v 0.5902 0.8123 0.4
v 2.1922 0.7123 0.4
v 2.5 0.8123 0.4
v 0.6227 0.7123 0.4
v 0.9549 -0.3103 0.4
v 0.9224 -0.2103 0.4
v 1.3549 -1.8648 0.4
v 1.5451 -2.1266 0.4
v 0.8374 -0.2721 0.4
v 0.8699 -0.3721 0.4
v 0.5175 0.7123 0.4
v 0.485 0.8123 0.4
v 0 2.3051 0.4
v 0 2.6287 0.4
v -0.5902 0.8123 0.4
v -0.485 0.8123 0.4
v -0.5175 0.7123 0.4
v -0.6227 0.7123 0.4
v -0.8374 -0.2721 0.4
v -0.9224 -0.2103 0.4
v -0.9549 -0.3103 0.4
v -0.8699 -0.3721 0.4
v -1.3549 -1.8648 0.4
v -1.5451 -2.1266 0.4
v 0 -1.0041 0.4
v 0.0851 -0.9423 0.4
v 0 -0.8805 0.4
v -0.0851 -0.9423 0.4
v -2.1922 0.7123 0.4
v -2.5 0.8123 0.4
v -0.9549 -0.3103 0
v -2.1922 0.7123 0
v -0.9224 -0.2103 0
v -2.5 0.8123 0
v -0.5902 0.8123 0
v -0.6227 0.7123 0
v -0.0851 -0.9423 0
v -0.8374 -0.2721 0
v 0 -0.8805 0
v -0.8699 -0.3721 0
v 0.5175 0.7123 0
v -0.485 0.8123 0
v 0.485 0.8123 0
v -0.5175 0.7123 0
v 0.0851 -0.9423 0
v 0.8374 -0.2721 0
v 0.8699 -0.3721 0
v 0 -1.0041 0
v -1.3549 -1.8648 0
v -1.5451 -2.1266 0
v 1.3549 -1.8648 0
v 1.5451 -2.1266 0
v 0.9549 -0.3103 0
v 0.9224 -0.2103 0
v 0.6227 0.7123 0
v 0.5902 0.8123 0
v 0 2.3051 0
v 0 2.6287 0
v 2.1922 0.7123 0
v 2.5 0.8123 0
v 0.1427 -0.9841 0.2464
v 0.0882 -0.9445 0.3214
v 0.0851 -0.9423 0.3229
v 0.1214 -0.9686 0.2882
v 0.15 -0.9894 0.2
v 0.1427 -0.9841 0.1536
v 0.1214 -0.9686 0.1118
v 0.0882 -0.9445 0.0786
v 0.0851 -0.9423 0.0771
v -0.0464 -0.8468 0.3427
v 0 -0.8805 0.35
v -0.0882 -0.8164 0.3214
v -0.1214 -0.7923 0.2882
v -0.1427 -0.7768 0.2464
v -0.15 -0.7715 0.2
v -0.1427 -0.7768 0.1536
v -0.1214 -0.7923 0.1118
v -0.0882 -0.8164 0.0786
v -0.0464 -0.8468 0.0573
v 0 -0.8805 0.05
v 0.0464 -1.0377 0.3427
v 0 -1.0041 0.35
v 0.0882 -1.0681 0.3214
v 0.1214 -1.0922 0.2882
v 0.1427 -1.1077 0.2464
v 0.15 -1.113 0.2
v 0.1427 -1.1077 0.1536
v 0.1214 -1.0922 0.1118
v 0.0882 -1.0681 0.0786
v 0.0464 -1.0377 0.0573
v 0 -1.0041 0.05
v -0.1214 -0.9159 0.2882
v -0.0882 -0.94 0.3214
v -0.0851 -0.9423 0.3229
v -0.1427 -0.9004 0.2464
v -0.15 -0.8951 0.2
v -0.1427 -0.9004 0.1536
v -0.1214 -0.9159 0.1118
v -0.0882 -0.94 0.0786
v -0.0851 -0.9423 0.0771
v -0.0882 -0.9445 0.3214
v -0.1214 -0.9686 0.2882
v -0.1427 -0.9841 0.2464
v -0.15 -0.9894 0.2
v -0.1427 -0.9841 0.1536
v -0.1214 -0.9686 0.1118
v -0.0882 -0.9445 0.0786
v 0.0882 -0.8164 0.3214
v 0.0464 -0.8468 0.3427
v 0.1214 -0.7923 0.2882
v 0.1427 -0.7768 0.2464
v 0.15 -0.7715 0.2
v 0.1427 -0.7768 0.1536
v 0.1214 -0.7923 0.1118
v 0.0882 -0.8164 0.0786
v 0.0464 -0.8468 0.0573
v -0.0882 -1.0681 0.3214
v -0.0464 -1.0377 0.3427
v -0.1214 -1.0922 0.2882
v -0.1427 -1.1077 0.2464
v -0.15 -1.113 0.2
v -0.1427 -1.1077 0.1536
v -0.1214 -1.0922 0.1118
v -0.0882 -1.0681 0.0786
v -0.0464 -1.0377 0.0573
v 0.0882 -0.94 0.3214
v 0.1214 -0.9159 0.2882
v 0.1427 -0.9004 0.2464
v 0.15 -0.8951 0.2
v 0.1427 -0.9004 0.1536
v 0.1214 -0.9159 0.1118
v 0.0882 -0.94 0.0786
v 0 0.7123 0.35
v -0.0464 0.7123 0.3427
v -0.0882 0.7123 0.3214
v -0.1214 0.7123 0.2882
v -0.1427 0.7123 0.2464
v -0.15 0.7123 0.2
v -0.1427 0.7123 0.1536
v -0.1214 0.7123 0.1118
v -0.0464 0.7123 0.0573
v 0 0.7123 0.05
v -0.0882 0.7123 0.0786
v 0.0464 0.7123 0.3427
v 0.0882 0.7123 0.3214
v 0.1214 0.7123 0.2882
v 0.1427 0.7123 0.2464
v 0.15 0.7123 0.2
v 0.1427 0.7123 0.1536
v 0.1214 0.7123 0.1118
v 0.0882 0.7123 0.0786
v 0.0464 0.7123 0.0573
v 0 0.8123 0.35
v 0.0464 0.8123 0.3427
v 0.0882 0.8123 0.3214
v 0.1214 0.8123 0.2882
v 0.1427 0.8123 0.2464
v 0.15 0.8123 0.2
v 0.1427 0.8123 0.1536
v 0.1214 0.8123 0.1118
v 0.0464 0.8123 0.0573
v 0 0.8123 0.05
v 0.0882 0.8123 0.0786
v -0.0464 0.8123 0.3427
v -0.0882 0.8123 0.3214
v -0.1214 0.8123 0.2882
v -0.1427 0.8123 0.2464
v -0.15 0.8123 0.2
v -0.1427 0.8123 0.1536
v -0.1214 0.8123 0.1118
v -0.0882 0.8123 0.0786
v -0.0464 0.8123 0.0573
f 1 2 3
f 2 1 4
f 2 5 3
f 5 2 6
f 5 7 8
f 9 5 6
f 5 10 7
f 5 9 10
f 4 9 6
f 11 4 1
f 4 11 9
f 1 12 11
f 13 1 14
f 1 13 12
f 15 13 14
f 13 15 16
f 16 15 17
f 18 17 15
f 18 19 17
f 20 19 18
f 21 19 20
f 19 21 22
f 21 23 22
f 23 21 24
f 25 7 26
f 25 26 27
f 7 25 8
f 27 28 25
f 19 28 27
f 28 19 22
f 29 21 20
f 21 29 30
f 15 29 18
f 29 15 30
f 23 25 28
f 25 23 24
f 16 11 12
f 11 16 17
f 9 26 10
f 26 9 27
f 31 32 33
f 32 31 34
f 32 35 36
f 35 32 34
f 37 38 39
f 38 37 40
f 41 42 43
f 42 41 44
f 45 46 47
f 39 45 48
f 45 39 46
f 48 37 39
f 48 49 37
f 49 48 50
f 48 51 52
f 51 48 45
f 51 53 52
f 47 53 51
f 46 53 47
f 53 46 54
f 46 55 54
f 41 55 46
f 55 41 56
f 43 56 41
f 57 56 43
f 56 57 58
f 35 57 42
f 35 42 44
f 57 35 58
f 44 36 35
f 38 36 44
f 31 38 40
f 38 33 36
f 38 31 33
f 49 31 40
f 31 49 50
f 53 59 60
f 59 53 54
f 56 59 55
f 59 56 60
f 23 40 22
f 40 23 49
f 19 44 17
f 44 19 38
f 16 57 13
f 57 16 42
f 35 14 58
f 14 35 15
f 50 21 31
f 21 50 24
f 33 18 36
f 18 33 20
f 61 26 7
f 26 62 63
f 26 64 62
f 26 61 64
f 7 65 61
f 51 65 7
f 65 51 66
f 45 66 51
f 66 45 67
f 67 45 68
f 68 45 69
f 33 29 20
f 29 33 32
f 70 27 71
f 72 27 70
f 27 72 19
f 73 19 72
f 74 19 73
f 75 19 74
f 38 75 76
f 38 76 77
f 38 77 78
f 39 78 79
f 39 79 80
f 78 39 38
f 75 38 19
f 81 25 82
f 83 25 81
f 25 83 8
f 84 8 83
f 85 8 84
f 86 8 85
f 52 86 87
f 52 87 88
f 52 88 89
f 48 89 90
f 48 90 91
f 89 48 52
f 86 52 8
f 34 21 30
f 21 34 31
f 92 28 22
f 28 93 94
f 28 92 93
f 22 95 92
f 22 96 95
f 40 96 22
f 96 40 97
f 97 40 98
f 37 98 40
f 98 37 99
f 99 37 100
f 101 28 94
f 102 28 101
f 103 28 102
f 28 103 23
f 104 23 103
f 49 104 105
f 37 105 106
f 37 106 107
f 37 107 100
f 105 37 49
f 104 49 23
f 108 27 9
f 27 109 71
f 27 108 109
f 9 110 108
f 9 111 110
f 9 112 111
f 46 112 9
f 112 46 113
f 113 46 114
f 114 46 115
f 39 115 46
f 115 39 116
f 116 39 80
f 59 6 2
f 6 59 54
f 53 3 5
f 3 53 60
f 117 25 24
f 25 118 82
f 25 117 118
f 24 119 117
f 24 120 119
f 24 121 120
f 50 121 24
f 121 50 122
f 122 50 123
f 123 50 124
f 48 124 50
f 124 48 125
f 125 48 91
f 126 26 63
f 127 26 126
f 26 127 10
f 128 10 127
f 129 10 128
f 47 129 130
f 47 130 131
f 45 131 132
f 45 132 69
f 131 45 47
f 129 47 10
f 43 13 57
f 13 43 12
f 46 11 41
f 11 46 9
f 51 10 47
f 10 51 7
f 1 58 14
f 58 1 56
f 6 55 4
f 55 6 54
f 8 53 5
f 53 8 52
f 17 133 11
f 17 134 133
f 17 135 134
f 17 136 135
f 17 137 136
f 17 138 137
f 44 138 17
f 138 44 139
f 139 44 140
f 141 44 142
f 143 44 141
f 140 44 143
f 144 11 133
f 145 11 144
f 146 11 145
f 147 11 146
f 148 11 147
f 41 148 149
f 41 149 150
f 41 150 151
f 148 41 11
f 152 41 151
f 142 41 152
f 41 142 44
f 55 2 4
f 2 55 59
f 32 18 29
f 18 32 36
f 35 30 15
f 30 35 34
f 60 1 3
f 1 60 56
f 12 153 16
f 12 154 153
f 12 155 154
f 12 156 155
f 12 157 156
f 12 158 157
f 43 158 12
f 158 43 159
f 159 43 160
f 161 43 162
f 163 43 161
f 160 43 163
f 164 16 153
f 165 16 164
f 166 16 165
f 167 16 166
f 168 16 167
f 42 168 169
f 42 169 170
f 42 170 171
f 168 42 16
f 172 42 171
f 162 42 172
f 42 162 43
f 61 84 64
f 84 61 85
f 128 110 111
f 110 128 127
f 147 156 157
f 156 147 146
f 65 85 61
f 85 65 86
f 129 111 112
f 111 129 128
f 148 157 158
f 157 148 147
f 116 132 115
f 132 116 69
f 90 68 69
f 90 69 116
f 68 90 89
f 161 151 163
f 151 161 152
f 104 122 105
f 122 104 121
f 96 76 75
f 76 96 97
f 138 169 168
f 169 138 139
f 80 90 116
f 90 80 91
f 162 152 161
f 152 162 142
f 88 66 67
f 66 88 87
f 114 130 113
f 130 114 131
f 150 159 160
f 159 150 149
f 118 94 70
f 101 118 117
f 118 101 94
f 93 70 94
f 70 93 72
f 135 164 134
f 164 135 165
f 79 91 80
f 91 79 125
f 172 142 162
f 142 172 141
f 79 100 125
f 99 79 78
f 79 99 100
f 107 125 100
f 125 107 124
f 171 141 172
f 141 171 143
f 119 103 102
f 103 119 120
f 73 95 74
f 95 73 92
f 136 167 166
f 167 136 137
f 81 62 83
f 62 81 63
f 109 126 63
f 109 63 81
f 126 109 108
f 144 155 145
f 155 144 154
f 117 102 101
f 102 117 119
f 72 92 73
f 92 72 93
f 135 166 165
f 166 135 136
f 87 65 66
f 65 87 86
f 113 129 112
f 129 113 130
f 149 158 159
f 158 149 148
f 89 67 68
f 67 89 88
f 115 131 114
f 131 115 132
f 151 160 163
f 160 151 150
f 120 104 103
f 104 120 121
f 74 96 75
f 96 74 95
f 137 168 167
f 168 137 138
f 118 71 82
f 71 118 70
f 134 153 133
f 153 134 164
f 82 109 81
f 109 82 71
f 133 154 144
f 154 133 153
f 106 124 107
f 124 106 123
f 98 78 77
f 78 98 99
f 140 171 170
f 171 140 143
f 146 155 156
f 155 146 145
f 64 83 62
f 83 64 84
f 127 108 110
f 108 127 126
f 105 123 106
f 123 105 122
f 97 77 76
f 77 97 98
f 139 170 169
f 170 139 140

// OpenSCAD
//Customizable Pentagram Yule Tree Topper
//Created by Ari M. Diacou, January 2014
//Shared under Creative Commons License: Attribution-ShareAlike 3.0 Unported (CC BY-SA 3.0) 
//see http://creativecommons.org/licenses/by-sa/3.0/

// preview[view:south, tilt:top diagonal]
//The length of one of the sides of the star
length=5;
//The thickness of one of the sides of the star
thickness=.1;
//The height of one of the sides of the star
height=.4;
//The diameter of the hole for the tree topper
hole=.3;

/* HIDDEN */
angle=36+0;
phi=(1+sqrt(5))/2;
a=length/(2*phi+1);
r=length*cos(angle)/((4*phi+2)*sin(angle));

module side(){
	mirror([0,1,0]){
		difference(){
			cube([length,thickness,height]);
			rotate([0,0,angle]) 
				cube([thickness/sin(angle),thickness,height]);
			translate([length,0,0]) 	
				mirror([1,0,0]){
					rotate([0,0,angle]) 
						cube([thickness/sin(angle),thickness,height]);
					}
			}
		}
	}

difference(){
	for(i=[1:5]){
	   rotate([0,0,i*2*angle]) 
			translate([-length/2,r,0]) 
				side();
		}
	translate([0,r+thickness/100,height/2])
		rotate([90,0,0])
			cylinder(r=hole/2,h=length, $fn=20);
	}
